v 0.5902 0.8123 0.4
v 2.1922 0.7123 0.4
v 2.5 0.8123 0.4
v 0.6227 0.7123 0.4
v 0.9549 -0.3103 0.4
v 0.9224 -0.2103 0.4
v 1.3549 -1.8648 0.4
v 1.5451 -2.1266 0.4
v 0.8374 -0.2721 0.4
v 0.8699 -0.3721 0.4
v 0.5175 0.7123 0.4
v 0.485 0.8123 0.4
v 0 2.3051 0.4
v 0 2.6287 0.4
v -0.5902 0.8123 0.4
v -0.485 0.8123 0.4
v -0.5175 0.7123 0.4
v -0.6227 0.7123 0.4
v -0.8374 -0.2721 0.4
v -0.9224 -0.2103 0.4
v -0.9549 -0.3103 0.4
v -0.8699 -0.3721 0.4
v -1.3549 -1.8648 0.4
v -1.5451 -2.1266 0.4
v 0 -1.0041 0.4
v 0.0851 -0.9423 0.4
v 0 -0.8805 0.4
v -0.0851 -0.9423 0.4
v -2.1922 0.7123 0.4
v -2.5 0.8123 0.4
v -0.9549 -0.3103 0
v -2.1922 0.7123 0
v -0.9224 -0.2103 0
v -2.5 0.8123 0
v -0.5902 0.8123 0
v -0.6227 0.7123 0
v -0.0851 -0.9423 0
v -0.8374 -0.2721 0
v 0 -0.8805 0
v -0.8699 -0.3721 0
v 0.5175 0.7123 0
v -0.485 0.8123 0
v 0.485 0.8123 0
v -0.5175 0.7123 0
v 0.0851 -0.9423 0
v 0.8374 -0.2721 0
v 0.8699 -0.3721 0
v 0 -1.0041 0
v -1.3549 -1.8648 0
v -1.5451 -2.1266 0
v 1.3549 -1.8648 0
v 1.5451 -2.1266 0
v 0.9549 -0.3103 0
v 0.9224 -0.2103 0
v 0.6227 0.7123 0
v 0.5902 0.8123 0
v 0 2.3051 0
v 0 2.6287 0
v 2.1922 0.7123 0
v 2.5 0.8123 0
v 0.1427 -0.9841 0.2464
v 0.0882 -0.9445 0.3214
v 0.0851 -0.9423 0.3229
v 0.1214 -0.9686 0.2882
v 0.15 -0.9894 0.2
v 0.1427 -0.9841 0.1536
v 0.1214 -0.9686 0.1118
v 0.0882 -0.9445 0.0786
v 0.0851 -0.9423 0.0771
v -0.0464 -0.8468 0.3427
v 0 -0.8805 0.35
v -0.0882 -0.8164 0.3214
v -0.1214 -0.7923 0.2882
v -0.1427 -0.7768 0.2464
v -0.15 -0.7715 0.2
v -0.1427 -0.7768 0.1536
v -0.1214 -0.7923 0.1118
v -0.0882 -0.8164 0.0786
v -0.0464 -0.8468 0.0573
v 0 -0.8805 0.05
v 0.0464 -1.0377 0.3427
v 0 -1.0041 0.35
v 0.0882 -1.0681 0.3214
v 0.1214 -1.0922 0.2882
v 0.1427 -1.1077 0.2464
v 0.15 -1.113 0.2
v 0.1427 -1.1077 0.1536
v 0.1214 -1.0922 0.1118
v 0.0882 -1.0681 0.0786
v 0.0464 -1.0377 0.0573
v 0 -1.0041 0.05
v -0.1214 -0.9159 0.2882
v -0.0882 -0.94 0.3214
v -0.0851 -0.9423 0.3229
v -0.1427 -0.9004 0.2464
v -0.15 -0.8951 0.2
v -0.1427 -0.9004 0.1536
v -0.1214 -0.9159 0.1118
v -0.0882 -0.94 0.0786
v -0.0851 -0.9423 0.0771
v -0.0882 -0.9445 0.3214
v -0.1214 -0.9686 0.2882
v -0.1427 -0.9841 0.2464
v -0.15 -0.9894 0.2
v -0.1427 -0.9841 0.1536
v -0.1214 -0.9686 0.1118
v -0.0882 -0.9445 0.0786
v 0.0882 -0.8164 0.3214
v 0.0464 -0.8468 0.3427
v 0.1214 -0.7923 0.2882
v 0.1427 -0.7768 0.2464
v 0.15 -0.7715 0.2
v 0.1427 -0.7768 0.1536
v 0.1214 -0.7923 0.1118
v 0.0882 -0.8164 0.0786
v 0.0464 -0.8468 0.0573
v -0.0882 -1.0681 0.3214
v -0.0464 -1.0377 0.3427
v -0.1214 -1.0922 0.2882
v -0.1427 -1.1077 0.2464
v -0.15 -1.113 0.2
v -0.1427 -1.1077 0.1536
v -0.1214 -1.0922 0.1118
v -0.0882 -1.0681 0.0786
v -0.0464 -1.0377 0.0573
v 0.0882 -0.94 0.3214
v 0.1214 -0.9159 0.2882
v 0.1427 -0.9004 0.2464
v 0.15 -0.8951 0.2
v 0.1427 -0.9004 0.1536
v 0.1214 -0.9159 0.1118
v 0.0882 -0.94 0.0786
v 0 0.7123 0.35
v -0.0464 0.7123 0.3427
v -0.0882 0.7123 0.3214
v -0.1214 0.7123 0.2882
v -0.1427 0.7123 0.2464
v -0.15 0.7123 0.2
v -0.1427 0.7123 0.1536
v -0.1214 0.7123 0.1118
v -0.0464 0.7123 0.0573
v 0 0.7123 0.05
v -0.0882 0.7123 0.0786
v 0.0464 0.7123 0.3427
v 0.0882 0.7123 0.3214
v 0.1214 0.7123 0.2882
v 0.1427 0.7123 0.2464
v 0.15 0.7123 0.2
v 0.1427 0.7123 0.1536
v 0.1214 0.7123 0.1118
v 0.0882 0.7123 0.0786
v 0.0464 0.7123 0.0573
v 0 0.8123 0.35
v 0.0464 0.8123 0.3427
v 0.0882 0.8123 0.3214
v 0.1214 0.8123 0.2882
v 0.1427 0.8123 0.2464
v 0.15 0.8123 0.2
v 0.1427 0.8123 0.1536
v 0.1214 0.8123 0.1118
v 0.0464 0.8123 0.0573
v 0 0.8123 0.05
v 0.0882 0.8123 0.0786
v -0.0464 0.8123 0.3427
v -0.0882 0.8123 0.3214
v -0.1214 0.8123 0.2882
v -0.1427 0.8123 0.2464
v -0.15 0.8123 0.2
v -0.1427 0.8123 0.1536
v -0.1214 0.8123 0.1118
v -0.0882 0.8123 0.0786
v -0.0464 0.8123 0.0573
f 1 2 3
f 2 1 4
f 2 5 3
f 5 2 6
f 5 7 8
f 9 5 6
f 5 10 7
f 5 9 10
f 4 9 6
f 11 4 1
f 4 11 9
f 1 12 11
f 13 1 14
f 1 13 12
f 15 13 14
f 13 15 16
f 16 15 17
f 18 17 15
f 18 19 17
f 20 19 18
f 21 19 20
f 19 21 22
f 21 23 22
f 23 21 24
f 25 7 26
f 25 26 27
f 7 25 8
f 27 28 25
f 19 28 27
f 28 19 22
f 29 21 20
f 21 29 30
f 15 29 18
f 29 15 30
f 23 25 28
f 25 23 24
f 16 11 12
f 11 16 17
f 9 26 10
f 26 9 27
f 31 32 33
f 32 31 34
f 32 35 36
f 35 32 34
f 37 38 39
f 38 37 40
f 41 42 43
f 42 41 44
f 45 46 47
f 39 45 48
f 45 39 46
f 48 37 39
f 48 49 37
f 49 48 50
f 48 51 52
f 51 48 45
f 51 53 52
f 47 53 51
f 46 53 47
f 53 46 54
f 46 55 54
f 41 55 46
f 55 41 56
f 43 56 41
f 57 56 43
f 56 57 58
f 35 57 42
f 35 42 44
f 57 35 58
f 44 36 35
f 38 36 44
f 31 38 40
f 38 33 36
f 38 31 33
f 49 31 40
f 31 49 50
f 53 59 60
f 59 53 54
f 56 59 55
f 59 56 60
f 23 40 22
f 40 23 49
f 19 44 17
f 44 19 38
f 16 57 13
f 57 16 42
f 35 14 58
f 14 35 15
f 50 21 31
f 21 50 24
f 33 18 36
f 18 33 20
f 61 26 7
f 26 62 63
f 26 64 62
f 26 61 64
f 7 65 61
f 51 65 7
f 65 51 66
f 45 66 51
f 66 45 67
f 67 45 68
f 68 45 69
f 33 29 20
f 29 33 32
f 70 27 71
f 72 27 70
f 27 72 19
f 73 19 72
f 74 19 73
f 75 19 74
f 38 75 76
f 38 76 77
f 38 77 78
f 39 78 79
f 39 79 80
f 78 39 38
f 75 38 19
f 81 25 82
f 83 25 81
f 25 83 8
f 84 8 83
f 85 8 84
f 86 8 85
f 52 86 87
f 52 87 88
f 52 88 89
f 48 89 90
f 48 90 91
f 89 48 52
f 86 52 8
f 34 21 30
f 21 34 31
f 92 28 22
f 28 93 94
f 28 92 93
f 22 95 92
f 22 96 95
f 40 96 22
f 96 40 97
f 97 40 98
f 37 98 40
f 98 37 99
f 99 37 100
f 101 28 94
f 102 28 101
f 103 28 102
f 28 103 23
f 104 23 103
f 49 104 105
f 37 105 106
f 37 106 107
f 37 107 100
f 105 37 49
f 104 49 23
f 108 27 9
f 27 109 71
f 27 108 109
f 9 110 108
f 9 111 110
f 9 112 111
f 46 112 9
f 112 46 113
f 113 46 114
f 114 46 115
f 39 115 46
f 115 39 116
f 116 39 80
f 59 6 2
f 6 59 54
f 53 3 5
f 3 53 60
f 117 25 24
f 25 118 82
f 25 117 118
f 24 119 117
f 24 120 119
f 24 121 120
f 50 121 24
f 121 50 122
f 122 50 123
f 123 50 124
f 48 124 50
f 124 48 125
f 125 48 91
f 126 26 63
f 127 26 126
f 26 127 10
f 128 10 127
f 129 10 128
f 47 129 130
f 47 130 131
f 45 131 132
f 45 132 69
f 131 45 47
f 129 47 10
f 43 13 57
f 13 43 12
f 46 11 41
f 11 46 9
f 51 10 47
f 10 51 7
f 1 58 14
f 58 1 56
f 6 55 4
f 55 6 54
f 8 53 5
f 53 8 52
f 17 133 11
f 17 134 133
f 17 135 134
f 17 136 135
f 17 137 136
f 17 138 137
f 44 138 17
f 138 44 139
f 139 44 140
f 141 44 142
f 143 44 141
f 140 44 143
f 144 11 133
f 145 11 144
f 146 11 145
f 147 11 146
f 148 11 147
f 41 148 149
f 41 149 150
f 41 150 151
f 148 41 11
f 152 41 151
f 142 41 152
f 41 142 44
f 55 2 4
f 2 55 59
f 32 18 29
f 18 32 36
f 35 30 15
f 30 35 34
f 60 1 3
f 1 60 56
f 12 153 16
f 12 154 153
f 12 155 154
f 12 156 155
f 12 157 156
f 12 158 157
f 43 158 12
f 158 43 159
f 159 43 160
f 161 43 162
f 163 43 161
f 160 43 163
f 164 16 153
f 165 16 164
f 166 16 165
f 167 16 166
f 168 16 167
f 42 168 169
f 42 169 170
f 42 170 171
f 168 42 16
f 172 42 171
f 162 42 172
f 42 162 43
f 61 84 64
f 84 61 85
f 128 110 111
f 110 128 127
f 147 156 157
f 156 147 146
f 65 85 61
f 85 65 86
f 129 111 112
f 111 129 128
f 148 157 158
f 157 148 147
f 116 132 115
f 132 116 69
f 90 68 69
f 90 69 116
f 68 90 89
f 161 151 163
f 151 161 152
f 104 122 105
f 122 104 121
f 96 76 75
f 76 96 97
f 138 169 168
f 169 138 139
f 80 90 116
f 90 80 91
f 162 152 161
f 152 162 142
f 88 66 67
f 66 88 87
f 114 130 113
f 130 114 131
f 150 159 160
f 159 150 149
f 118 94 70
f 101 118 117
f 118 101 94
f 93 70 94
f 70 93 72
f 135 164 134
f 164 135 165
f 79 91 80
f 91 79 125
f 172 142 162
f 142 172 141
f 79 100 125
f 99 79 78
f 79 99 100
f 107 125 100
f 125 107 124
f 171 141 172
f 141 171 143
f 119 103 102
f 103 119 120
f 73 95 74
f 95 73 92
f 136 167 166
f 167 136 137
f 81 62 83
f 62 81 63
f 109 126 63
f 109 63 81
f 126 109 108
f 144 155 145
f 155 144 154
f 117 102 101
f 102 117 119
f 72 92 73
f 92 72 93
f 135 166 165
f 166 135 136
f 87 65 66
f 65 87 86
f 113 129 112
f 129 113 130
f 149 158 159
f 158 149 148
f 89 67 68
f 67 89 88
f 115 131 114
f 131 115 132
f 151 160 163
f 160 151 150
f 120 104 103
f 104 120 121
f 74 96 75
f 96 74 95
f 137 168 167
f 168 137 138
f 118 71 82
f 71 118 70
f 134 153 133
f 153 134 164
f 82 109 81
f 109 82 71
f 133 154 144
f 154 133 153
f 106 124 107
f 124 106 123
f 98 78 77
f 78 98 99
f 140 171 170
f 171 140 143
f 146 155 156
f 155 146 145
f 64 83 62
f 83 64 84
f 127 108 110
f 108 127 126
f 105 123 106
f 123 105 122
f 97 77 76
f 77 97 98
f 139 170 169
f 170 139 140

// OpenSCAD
//Customizable Pentagram Yule Tree Topper
//Created by Ari M. Diacou, January 2014
//Shared under Creative Commons License: Attribution-ShareAlike 3.0 Unported (CC BY-SA 3.0) 
//see http://creativecommons.org/licenses/by-sa/3.0/

// preview[view:south, tilt:top diagonal]
//The length of one of the sides of the star
length=5;
//The thickness of one of the sides of the star
thickness=.1;
//The height of one of the sides of the star
height=.4;
//The diameter of the hole for the tree topper
hole=.3;

/* HIDDEN */
angle=36+0;
phi=(1+sqrt(5))/2;
a=length/(2*phi+1);
r=length*cos(angle)/((4*phi+2)*sin(angle));

module side(){
	mirror([0,1,0]){
		difference(){
			cube([length,thickness,height]);
			rotate([0,0,angle]) 
				cube([thickness/sin(angle),thickness,height]);
			translate([length,0,0]) 	
				mirror([1,0,0]){
					rotate([0,0,angle]) 
						cube([thickness/sin(angle),thickness,height]);
					}
			}
		}
	}

difference(){
	for(i=[1:5]){
	   rotate([0,0,i*2*angle]) 
			translate([-length/2,r,0]) 
				side();
		}
	translate([0,r+thickness/100,height/2])
		rotate([90,0,0])
			cylinder(r=hole/2,h=length, $fn=20);
	}
